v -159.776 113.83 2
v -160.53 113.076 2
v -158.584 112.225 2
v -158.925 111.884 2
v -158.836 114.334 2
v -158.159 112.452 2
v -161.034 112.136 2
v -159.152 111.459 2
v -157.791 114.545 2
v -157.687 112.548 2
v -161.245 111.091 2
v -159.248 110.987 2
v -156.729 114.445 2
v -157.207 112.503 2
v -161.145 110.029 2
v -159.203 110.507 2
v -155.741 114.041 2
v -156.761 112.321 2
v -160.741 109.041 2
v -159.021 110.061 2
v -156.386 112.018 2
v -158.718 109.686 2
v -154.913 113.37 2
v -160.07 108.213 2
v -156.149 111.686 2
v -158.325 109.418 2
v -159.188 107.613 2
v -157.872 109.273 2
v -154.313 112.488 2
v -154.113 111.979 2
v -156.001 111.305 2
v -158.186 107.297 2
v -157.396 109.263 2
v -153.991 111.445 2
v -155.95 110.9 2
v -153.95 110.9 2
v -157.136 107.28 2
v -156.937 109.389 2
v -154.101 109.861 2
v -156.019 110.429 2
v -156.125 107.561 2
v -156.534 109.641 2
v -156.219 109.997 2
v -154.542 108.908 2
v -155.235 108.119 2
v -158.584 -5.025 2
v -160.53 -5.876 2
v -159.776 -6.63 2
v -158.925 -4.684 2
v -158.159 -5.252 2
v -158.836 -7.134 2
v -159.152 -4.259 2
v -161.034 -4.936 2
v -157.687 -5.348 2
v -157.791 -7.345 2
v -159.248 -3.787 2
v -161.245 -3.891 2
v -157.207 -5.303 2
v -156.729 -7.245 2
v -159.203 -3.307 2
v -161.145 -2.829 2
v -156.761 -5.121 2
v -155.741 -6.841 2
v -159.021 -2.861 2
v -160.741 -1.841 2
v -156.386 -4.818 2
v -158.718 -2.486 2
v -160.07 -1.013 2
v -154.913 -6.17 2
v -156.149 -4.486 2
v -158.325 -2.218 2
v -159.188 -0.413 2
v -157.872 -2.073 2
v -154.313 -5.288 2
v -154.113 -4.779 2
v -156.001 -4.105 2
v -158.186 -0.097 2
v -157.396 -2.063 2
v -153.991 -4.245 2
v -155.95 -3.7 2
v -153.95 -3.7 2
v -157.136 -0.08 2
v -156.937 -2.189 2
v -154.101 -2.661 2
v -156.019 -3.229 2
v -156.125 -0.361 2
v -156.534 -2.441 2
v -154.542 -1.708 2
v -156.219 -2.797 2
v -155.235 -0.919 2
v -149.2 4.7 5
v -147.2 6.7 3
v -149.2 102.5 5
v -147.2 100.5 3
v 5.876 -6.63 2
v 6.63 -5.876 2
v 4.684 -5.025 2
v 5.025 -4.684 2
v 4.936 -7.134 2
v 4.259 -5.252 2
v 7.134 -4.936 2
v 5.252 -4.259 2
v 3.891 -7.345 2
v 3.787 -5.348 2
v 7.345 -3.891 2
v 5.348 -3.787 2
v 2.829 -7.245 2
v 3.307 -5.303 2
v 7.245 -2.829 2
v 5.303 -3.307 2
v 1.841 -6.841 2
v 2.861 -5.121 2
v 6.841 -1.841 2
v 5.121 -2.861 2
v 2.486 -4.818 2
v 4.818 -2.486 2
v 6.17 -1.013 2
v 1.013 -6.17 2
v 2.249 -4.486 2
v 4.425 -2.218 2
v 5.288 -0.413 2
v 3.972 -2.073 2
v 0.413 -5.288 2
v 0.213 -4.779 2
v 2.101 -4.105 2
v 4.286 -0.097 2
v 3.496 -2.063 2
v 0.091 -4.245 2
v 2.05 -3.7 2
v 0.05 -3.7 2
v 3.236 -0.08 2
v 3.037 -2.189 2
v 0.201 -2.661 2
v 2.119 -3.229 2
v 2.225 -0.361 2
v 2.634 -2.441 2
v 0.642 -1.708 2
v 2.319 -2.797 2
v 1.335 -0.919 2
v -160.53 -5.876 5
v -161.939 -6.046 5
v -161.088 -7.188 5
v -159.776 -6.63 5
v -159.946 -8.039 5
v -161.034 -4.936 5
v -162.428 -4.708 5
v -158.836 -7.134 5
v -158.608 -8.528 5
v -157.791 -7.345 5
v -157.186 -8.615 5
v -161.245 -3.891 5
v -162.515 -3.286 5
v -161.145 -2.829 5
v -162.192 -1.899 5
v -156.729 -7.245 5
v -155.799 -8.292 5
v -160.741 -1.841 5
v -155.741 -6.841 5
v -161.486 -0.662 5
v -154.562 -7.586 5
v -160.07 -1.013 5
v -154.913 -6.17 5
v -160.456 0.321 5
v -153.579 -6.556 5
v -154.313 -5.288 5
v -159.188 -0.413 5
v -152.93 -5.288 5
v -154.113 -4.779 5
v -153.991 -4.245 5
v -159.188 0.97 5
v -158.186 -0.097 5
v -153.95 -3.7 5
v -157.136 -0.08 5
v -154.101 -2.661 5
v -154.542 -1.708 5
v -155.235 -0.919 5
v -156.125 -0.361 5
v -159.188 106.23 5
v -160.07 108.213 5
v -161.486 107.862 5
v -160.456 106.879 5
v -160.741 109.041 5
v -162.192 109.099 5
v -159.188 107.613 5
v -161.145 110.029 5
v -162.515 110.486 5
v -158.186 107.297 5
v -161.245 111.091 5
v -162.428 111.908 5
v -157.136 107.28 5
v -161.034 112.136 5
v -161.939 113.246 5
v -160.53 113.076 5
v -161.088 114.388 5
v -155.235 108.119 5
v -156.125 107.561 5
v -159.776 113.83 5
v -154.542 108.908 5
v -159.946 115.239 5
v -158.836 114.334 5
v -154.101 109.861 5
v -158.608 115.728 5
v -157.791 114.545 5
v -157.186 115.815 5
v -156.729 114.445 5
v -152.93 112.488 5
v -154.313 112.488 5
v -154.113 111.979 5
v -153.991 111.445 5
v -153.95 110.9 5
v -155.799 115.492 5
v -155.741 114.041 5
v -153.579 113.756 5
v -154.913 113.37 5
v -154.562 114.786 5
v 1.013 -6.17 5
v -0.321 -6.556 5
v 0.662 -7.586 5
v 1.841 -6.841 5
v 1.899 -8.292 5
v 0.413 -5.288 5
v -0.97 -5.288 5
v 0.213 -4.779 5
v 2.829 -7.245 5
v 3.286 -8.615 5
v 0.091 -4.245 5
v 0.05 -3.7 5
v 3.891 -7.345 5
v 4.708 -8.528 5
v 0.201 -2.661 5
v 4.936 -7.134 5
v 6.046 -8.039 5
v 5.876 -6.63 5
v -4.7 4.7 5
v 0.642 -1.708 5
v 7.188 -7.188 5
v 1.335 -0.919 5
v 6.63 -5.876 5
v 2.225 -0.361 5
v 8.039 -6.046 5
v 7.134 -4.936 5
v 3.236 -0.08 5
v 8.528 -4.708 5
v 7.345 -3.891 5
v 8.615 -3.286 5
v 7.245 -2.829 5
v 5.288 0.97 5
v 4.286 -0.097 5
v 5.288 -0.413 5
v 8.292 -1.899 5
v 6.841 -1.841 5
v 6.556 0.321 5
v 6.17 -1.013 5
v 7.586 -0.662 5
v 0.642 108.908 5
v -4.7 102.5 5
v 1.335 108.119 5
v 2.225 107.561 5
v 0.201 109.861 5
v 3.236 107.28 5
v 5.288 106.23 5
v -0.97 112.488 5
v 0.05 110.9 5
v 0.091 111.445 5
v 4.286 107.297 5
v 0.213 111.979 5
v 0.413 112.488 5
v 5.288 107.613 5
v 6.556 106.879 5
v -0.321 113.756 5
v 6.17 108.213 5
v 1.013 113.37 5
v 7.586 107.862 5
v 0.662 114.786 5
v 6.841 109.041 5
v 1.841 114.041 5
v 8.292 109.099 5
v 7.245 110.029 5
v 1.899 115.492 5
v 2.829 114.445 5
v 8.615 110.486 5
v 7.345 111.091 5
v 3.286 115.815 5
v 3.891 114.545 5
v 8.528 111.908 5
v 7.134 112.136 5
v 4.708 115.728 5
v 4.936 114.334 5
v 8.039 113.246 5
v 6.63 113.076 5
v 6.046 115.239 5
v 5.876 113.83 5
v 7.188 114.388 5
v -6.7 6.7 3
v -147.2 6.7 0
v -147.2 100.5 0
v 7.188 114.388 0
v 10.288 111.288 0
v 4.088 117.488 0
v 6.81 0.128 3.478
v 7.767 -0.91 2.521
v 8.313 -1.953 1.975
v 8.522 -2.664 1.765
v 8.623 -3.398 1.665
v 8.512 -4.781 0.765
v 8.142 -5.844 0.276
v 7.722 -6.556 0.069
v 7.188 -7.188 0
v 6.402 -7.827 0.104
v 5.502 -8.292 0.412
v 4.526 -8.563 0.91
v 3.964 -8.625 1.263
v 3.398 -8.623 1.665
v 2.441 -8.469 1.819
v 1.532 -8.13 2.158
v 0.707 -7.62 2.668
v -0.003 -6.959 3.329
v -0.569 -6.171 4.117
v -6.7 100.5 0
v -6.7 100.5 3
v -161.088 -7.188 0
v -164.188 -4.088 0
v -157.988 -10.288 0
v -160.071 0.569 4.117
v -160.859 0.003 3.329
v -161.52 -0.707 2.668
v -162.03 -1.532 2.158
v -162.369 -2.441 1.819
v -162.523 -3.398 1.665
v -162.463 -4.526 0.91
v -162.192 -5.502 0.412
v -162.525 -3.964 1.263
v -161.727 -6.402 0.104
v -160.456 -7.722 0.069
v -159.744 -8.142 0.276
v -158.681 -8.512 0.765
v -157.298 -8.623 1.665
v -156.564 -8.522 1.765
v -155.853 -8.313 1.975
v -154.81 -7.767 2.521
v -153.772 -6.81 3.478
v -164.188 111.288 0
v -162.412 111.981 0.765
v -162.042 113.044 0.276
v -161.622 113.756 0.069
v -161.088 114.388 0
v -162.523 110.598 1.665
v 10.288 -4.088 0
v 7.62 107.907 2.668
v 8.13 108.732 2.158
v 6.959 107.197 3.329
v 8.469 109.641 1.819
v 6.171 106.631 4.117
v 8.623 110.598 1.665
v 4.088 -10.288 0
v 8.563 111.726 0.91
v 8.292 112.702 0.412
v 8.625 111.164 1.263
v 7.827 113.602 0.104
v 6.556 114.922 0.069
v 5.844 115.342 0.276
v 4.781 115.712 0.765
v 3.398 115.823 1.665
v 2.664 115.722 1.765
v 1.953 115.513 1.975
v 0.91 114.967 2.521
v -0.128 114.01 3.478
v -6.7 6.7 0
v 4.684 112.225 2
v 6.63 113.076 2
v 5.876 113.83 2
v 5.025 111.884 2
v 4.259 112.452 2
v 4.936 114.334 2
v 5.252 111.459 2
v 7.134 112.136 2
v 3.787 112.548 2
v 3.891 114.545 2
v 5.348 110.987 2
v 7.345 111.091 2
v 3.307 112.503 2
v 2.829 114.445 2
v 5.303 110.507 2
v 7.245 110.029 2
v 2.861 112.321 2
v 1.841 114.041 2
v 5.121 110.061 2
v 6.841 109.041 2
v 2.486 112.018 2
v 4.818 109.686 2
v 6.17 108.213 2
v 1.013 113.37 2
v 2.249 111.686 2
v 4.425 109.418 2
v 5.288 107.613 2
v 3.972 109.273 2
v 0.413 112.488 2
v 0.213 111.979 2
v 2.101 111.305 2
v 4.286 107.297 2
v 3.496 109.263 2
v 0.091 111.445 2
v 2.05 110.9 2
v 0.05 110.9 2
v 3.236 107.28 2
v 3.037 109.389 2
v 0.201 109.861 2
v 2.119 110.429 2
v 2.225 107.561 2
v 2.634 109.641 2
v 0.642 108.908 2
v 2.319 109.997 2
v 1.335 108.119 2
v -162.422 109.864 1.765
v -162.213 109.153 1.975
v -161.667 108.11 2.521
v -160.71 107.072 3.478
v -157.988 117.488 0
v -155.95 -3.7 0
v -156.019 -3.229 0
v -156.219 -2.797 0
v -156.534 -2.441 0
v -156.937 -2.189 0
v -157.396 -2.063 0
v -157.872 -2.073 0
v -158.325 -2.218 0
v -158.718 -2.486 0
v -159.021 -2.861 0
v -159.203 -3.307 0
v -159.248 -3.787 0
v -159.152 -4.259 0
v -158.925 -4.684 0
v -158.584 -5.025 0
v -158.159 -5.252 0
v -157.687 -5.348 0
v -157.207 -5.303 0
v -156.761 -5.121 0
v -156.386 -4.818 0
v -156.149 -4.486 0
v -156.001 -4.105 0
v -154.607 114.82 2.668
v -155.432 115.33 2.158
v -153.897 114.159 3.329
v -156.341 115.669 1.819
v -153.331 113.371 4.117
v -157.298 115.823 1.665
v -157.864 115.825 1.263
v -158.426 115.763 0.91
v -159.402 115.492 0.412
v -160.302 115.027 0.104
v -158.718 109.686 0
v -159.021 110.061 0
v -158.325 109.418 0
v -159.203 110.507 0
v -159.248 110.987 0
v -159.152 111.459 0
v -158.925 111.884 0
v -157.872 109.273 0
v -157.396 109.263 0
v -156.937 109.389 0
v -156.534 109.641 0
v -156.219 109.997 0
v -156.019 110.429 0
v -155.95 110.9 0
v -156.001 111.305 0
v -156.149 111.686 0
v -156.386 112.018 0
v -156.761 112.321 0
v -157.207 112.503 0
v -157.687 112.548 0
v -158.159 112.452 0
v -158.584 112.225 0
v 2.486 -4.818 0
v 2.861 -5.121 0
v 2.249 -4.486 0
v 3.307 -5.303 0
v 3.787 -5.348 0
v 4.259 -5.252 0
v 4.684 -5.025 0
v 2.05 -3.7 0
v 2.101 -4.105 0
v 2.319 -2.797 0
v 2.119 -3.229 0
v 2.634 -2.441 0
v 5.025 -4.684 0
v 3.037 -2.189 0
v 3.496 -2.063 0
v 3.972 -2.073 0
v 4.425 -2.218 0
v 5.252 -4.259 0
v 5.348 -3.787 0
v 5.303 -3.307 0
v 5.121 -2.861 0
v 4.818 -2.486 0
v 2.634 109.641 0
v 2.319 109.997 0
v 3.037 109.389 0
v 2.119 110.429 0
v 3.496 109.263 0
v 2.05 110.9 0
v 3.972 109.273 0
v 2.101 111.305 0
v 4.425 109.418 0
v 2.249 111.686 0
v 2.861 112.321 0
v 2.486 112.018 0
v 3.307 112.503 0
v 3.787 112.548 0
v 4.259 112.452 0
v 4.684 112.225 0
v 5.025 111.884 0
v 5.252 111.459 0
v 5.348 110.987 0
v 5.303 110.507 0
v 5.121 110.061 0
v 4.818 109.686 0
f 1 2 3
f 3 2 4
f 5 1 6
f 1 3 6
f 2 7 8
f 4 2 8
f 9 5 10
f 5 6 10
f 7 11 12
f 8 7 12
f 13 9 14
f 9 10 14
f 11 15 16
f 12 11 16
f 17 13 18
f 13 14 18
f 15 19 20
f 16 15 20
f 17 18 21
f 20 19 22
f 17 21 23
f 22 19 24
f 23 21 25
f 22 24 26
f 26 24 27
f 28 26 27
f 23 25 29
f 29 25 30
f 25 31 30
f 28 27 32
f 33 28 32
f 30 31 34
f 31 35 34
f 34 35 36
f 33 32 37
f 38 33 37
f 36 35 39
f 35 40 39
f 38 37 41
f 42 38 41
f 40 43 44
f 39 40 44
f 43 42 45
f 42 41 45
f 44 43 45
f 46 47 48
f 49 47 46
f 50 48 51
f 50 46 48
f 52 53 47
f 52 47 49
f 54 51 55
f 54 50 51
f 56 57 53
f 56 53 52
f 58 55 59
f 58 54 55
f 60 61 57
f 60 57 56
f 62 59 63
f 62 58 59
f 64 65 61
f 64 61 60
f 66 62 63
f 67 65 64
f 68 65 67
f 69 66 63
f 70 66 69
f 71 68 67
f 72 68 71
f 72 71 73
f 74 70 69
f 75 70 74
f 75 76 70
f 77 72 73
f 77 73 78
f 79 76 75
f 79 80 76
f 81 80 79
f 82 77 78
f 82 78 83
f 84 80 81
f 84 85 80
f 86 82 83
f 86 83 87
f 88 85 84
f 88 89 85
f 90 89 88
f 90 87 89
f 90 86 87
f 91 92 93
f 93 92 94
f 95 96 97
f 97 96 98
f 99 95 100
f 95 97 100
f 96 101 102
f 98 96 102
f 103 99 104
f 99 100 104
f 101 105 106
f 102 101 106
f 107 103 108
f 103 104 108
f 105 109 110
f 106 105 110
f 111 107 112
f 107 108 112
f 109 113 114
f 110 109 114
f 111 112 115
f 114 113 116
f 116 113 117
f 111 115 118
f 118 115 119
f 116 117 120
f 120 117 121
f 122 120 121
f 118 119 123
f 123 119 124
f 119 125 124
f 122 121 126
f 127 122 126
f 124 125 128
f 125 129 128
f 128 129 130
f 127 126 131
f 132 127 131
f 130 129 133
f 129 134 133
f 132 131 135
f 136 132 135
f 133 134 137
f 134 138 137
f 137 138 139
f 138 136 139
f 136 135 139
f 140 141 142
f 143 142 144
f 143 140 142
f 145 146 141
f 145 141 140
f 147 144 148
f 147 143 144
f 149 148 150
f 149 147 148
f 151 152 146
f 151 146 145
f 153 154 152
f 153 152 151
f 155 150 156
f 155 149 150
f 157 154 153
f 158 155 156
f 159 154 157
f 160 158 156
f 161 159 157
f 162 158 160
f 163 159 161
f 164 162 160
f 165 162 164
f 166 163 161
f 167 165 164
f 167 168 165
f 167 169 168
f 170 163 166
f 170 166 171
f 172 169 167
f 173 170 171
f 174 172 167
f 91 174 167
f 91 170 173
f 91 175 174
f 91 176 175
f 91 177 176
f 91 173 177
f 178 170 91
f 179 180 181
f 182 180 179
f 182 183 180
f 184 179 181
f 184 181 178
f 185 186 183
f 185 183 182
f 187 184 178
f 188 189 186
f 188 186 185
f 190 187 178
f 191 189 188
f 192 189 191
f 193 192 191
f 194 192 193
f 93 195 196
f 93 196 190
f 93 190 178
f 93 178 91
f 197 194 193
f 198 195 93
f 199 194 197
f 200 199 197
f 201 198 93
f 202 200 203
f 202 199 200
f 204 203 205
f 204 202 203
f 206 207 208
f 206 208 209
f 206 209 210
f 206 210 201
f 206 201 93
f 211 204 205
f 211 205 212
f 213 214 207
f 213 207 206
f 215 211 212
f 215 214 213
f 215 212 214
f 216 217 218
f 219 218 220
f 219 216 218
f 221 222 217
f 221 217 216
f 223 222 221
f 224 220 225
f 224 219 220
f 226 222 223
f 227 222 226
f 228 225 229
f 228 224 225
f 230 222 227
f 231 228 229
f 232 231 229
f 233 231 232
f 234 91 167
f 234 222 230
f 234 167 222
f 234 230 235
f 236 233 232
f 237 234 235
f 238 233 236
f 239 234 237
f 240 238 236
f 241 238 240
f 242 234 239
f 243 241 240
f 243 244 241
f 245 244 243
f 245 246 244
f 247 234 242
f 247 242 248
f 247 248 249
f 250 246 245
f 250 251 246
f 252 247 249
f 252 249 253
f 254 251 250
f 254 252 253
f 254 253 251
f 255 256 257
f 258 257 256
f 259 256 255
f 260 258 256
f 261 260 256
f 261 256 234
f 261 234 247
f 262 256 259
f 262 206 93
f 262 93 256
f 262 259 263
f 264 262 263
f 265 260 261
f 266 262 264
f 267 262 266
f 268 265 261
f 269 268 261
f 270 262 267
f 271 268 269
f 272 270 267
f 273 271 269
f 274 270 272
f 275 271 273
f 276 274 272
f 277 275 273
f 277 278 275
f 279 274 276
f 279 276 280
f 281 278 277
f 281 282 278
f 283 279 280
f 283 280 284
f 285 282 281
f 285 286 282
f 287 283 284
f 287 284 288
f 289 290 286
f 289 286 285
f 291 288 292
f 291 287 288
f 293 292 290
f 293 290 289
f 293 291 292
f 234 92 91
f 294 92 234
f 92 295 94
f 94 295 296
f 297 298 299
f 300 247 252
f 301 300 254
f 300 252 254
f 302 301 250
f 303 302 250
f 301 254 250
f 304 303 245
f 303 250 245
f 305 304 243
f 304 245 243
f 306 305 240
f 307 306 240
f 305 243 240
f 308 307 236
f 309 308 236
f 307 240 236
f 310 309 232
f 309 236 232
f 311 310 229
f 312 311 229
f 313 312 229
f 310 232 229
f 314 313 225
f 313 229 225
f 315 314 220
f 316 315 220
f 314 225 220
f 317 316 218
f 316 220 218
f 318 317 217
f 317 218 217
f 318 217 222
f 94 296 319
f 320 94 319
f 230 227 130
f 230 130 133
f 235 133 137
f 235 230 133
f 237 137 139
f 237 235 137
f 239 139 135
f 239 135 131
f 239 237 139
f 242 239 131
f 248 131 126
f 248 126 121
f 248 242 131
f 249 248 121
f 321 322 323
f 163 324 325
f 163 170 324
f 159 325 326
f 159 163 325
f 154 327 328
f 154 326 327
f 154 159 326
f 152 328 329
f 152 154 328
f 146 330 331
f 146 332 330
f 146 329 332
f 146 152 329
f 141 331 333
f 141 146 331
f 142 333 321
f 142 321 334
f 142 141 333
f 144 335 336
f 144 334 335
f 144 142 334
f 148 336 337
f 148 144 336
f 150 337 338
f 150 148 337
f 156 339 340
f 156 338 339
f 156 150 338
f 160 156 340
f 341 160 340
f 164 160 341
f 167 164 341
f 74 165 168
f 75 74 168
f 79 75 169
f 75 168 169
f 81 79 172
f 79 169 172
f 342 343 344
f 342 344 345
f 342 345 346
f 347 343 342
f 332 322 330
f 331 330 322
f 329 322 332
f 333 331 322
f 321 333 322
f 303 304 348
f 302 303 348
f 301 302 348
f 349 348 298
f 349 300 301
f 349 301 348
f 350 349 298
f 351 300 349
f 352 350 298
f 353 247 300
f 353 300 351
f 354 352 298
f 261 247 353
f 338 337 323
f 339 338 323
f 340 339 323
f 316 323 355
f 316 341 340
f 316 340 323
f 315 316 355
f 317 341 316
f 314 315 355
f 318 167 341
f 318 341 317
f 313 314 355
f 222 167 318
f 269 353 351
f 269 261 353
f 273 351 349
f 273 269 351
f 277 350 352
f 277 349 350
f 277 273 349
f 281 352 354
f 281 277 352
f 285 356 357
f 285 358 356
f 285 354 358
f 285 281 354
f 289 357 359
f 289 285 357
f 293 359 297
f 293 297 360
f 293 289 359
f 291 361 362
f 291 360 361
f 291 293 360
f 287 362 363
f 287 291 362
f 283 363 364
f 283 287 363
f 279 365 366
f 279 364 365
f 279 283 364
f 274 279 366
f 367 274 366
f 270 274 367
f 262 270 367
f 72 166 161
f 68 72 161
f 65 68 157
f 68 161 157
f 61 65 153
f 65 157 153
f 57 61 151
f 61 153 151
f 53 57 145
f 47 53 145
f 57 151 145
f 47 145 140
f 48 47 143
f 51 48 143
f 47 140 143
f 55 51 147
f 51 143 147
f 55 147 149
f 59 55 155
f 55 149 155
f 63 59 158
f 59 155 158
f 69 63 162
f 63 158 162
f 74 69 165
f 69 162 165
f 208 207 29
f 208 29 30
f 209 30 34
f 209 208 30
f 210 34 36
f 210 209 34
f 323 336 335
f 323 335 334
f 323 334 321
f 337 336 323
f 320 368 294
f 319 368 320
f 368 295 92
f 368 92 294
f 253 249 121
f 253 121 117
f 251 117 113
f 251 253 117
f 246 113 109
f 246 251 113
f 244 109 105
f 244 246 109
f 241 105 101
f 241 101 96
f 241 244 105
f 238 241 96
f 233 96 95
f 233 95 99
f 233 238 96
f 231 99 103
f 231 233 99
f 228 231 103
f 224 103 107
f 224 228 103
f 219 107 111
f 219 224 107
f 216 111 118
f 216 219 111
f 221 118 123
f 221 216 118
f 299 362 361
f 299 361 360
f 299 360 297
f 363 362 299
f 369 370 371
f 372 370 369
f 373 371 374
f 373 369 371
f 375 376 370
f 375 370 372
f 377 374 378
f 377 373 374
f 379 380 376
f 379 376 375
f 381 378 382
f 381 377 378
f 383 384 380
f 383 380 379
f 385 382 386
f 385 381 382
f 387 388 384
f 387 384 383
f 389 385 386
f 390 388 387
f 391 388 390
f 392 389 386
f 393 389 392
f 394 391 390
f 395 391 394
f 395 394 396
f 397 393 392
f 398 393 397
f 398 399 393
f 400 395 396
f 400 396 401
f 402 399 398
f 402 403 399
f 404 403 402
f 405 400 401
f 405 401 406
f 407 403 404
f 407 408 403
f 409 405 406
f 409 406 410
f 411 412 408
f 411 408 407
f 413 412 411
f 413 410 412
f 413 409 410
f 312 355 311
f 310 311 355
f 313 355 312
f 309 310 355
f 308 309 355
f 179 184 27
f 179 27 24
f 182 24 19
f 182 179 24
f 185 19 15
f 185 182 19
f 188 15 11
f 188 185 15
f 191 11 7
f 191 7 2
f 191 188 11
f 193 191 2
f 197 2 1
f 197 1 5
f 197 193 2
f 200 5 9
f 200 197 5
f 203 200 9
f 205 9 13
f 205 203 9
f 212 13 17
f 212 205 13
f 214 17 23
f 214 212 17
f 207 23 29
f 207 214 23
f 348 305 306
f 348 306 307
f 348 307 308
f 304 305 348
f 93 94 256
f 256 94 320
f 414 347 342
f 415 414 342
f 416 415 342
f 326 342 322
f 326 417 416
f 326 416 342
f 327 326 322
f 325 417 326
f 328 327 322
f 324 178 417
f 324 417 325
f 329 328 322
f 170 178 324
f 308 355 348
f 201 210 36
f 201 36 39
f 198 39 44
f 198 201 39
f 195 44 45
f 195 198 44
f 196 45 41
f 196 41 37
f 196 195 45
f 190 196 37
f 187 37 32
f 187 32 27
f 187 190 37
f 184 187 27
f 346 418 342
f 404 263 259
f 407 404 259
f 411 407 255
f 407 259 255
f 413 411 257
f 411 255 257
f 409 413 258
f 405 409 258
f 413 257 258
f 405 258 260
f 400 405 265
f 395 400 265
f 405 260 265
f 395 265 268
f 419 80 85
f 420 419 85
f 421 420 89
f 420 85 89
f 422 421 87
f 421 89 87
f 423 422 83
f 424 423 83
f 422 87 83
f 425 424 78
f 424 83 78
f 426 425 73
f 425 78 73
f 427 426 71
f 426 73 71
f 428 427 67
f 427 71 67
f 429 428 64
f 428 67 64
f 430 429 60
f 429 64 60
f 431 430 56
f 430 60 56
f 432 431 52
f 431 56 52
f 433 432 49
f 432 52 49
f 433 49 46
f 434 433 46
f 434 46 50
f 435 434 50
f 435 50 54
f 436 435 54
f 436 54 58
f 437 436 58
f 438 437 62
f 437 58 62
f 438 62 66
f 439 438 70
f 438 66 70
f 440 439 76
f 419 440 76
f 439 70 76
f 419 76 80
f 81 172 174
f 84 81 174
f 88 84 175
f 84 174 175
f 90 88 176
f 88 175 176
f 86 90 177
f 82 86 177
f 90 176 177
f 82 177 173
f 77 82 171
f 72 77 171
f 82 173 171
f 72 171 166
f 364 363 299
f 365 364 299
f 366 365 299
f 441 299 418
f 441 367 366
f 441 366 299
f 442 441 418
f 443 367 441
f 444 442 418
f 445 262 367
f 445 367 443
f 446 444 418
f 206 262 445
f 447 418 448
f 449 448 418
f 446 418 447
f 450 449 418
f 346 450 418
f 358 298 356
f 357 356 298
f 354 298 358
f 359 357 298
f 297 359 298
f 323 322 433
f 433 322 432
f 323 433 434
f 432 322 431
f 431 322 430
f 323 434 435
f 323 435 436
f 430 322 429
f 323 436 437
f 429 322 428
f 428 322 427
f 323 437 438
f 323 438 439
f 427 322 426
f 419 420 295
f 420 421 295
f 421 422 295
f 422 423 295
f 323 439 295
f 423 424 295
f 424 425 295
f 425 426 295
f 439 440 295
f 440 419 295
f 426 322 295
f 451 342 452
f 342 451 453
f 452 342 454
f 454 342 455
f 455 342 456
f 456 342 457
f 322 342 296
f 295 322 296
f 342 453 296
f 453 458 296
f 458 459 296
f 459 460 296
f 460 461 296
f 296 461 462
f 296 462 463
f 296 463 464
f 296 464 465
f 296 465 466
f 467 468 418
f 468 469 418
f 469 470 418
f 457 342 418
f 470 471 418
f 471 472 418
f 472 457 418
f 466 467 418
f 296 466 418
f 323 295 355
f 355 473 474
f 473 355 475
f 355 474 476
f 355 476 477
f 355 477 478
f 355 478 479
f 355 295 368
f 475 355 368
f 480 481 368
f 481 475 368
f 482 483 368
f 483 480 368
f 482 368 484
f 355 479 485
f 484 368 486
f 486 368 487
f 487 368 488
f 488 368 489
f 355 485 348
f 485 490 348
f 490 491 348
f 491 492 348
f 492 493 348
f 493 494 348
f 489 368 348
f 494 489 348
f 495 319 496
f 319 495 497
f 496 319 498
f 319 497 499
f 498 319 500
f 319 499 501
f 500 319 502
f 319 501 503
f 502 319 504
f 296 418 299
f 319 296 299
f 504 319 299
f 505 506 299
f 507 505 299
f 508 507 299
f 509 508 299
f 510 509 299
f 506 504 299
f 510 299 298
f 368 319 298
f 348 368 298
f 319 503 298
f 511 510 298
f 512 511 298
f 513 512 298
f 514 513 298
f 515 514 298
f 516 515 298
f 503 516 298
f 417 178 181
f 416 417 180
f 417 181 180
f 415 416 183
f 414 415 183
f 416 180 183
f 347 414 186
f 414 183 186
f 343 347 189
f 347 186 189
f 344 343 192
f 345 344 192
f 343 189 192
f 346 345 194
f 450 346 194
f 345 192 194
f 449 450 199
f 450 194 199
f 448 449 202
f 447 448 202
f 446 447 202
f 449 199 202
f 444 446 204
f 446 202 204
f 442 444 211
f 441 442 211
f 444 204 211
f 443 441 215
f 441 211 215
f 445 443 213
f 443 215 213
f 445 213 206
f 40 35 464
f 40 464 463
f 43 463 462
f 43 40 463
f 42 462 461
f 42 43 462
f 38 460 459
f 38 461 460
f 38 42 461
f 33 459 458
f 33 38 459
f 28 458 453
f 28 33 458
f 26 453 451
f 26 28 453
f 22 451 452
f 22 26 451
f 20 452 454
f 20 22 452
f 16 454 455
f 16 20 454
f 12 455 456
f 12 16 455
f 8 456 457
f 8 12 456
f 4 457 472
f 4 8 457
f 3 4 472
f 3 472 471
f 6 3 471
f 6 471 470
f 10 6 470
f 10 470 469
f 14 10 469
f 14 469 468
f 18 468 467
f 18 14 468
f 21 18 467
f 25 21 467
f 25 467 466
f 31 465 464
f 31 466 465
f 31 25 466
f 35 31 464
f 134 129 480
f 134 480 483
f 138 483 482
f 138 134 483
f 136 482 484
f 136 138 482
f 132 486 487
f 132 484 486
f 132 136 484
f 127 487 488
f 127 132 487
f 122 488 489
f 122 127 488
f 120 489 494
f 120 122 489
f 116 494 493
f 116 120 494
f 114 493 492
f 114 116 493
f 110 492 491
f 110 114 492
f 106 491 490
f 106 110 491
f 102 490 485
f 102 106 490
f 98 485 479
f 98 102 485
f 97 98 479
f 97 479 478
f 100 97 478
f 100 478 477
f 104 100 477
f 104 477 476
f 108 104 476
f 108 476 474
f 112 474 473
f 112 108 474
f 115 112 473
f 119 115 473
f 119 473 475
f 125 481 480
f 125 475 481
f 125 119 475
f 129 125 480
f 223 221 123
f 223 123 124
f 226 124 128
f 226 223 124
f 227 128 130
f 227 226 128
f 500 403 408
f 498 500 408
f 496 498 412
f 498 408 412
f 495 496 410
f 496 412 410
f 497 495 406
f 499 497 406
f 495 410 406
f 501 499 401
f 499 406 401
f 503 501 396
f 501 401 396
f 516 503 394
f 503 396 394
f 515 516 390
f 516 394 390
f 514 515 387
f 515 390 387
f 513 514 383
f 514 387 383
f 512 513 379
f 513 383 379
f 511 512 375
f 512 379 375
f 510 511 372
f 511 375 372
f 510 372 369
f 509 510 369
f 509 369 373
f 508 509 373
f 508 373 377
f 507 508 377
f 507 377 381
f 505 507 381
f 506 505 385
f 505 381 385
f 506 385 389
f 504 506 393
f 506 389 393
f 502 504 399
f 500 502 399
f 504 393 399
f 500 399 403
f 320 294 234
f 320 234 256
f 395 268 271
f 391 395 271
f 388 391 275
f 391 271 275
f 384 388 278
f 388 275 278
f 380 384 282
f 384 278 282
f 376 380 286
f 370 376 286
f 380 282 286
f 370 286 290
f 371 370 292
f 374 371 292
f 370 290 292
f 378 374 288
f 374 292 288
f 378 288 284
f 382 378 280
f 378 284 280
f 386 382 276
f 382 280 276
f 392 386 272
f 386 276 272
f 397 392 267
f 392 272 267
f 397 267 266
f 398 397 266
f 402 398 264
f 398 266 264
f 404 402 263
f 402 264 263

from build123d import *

# Parameters (mm, degrees)
SKETCH1_W                                  = 140.5
SKETCH1_H                                  = 93.8
BOSS_EXTRUDE1_DEPTH                        = 5
CHAMFER1_SIZE                              = 5
CHAMFER2_SIZE                              = 2
SKETCH2_R                                  = 1.65
CUT_EXTRUDE1_DEPTH                         = 15
BOSS_EXTRUDE2_DEPTH                        = 5
CUT_EXTRUDE2_DEPTH                         = 3
MIRROR1_AT_THE_SECOND_PLANE_COPY_1_SKETC_R = 1.65
MIRROR1_AT_THE_SECOND_PLANE_COPY_1_DEPTH   = 15
MIRROR1_AT_THE_SECOND_PLANE_COPY_2_DEPTH   = 5
MIRROR1_AT_THE_SECOND_PLANE_COPY_3_DEPTH   = 3


with BuildPart() as part:
    # Sketch1 → Boss-Extrude1 (new body)
    with BuildSketch(Plane.XY):
        Polygon((-157.987704918, -10.287704918), (4.087704918, -10.287704918), (10.287704918, -4.087704918), (10.287704918, 111.287704918), (4.087704918, 117.487704918), (-157.987704918, 117.487704918), (-164.187704918, 111.287704918), (-164.187704918, -4.087704918), align=None)
        with Locations((-76.95, 53.6)):
            Rectangle(SKETCH1_W, SKETCH1_H, mode=Mode.SUBTRACT)
    extrude(amount=BOSS_EXTRUDE1_DEPTH)

    # Chamfer1
    chamfer1_edges = [part.edges().sort_by_distance(p)[0] for p in [
        (7.187704918, 114.387704918, 5),
        (10.287704918, 53.6, 5),
        (7.187704918, -7.187704918, 5),
        (-76.95, -10.287704918, 5),
        (-161.087704918, -7.187704918, 5),
        (-164.187704918, 53.6, 5),
        (-76.95, 117.487704918, 5),
        (-161.087704918, 114.387704918, 5),
    ]]
    chamfer(chamfer1_edges, length=CHAMFER1_SIZE - 0.0001)  # a hair under: the kernel refuses the full size

    # Chamfer2
    chamfer2_edges = [part.edges().sort_by_distance(p)[0] for p in [
        (-6.7, 53.6, 5),
        (-76.95, 100.5, 5),
        (-147.2, 53.6, 5),
        (-76.95, 6.7, 5),
    ]]
    chamfer(chamfer2_edges, length=CHAMFER2_SIZE)

    # Sketch2 → Cut-Extrude1 (cut)
    with BuildSketch(Plane.XY.offset(5)):
        with Locations((-157.6, -3.7)):
            Circle(SKETCH2_R)
    cut_extrude1 = extrude(amount=-CUT_EXTRUDE1_DEPTH, mode=Mode.SUBTRACT)

    # Sketch2<3> → Boss-Extrude2 (add)
    with BuildSketch(Plane.XY.offset(5)):
        with BuildLine():
            ThreePointArc((-159.187704918, -0.413407069), (-155.659977185, -0.608267237), (-153.95, -3.7))
            ThreePointArc((-153.95, -3.7), (-154.042011509, -4.514381914), (-154.313407069, -5.287704918))
            Line((-154.313407069, -5.287704918), (-152.930164426, -5.287704918))
            ThreePointArc((-152.930164426, -5.287704918), (-152.733713968, -4.504631246), (-152.667640403, -3.7))
            ThreePointArc((-152.667640403, -3.7), (-154.727976358, 0.309944063), (-159.187704918, 0.969835574))
            Line((-159.187704918, 0.969835574), (-159.187704918, -0.413407069))
        make_face()
        with BuildLine():
            ThreePointArc((-154.313407069, -5.287704918), (-160.180939751, -6.280939751), (-159.187704918, -0.413407069))
            Line((-159.187704918, -0.413407069), (-159.187704918, 0.969835574))
            ThreePointArc((-159.187704918, 0.969835574), (-161.087704918, -7.187704918), (-152.930164426, -5.287704918))
            Line((-152.930164426, -5.287704918), (-154.313407069, -5.287704918))
        make_face()
        with BuildLine():
            ThreePointArc((-154.313407069, -5.287704918), (-154.042011509, -4.514381914), (-153.95, -3.7))
            ThreePointArc((-153.95, -3.7), (-155.659977185, -0.608267237), (-159.187704918, -0.413407069))
            Line((-159.187704918, -0.413407069), (-159.187704918, -2.016637106))
            Line((-159.187704918, -2.016637106), (-158.717916434, -2.486425591))
            ThreePointArc((-158.717916434, -2.486425591), (-156.937452687, -2.188864315), (-155.95, -3.7))
            ThreePointArc((-155.95, -3.7), (-156.062974012, -4.300042592), (-156.386425591, -4.817916434))
            Line((-156.386425591, -4.817916434), (-155.916637106, -5.287704918))
            Line((-155.916637106, -5.287704918), (-154.313407069, -5.287704918))
        make_face()
        with BuildLine():
            Line((-159.187704918, -2.016637106), (-159.187704918, -0.413407069))
            ThreePointArc((-159.187704918, -0.413407069), (-160.180939751, -6.280939751), (-154.313407069, -5.287704918))
            Line((-154.313407069, -5.287704918), (-155.916637106, -5.287704918))
            Line((-155.916637106, -5.287704918), (-156.386425591, -4.817916434))
            ThreePointArc((-156.386425591, -4.817916434), (-158.766726189, -4.866726189), (-158.717916434, -2.486425591))
            Line((-158.717916434, -2.486425591), (-159.187704918, -2.016637106))
        make_face()
    boss_extrude2 = extrude(amount=-BOSS_EXTRUDE2_DEPTH)

    # Sketch2<4> → Cut-Extrude2 (cut)
    with BuildSketch(Plane.XY.offset(5)):
        with BuildLine():
            ThreePointArc((-154.313407069, -5.287704918), (-154.042011509, -4.514381914), (-153.95, -3.7))
            ThreePointArc((-153.95, -3.7), (-155.659977185, -0.608267237), (-159.187704918, -0.413407069))
            Line((-159.187704918, -0.413407069), (-159.187704918, -2.016637106))
            Line((-159.187704918, -2.016637106), (-158.717916434, -2.486425591))
            ThreePointArc((-158.717916434, -2.486425591), (-156.937452687, -2.188864315), (-155.95, -3.7))
            ThreePointArc((-155.95, -3.7), (-156.062974012, -4.300042592), (-156.386425591, -4.817916434))
            Line((-156.386425591, -4.817916434), (-155.916637106, -5.287704918))
            Line((-155.916637106, -5.287704918), (-154.313407069, -5.287704918))
        make_face()
        with BuildLine():
            Line((-159.187704918, -2.016637106), (-159.187704918, -0.413407069))
            ThreePointArc((-159.187704918, -0.413407069), (-160.180939751, -6.280939751), (-154.313407069, -5.287704918))
            Line((-154.313407069, -5.287704918), (-155.916637106, -5.287704918))
            Line((-155.916637106, -5.287704918), (-156.386425591, -4.817916434))
            ThreePointArc((-156.386425591, -4.817916434), (-158.766726189, -4.866726189), (-158.717916434, -2.486425591))
            Line((-158.717916434, -2.486425591), (-159.187704918, -2.016637106))
        make_face()
    cut_extrude2 = extrude(amount=-CUT_EXTRUDE2_DEPTH, mode=Mode.SUBTRACT)

    # Mirror1: Cut-Extrude1, Boss-Extrude2, Cut-Extrude2 across plane
    add(cut_extrude1.mirror(Plane(origin=(-76.95, 0, 0), x_dir=(0, 0, 1), z_dir=(1, 0, 0))), mode=Mode.SUBTRACT)
    add(boss_extrude2.mirror(Plane(origin=(-76.95, 0, 0), x_dir=(0, 0, 1), z_dir=(1, 0, 0))))
    add(cut_extrude2.mirror(Plane(origin=(-76.95, 0, 0), x_dir=(0, 0, 1), z_dir=(1, 0, 0))), mode=Mode.SUBTRACT)

    # Mirror1 at the second plane: Cut-Extrude1, Boss-Extrude2, Cut-Extrude2 across plane
    add(cut_extrude1.mirror(Plane(origin=(0, 53.6, 0), x_dir=(0, 0, 1), z_dir=(0, -1, 0))), mode=Mode.SUBTRACT)
    add(boss_extrude2.mirror(Plane(origin=(0, 53.6, 0), x_dir=(0, 0, 1), z_dir=(0, -1, 0))))
    add(cut_extrude2.mirror(Plane(origin=(0, 53.6, 0), x_dir=(0, 0, 1), z_dir=(0, -1, 0))), mode=Mode.SUBTRACT)

    # Mirror1 at the second plane copy 1 sketc → Mirror1 at the second plane copy 1 (cut)
    with BuildSketch(Plane(origin=(-153.9, 107.2, 5), x_dir=(-1, 0, 0), z_dir=(0, 0, 1))):
        with Locations((-157.6, -3.7)):
            Circle(MIRROR1_AT_THE_SECOND_PLANE_COPY_1_SKETC_R)
    extrude(amount=-MIRROR1_AT_THE_SECOND_PLANE_COPY_1_DEPTH, mode=Mode.SUBTRACT)

    # Mirror1 at the second plane copy 2 sketc → Mirror1 at the second plane copy 2 (add)
    with BuildSketch(Plane(origin=(-153.9, 107.2, 5), x_dir=(-1, 0, 0), z_dir=(0, 0, 1))):
        with BuildLine():
            ThreePointArc((-159.187704918, -0.413407069), (-155.659977185, -0.608267237), (-153.95, -3.7))
            ThreePointArc((-153.95, -3.7), (-154.042011509, -4.514381914), (-154.313407069, -5.287704918))
            Line((-154.313407069, -5.287704918), (-152.930164426, -5.287704918))
            ThreePointArc((-152.930164426, -5.287704918), (-152.733713968, -4.504631246), (-152.667640403, -3.7))
            ThreePointArc((-152.667640403, -3.7), (-154.727976358, 0.309944063), (-159.187704918, 0.969835574))
            Line((-159.187704918, 0.969835574), (-159.187704918, -0.413407069))
        make_face()
        with BuildLine():
            ThreePointArc((-154.313407069, -5.287704918), (-160.180939751, -6.280939751), (-159.187704918, -0.413407069))
            Line((-159.187704918, -0.413407069), (-159.187704918, 0.969835574))
            ThreePointArc((-159.187704918, 0.969835574), (-161.087704918, -7.187704918), (-152.930164426, -5.287704918))
            Line((-152.930164426, -5.287704918), (-154.313407069, -5.287704918))
        make_face()
        with BuildLine():
            ThreePointArc((-154.313407069, -5.287704918), (-154.042011509, -4.514381914), (-153.95, -3.7))
            ThreePointArc((-153.95, -3.7), (-155.659977185, -0.608267237), (-159.187704918, -0.413407069))
            Line((-159.187704918, -0.413407069), (-159.187704918, -2.016637106))
            Line((-159.187704918, -2.016637106), (-158.717916434, -2.486425591))
            ThreePointArc((-158.717916434, -2.486425591), (-156.937452687, -2.188864315), (-155.95, -3.7))
            ThreePointArc((-155.95, -3.7), (-156.062974012, -4.300042592), (-156.386425591, -4.817916434))
            Line((-156.386425591, -4.817916434), (-155.916637106, -5.287704918))
            Line((-155.916637106, -5.287704918), (-154.313407069, -5.287704918))
        make_face()
        with BuildLine():
            Line((-159.187704918, -2.016637106), (-159.187704918, -0.413407069))
            ThreePointArc((-159.187704918, -0.413407069), (-160.180939751, -6.280939751), (-154.313407069, -5.287704918))
            Line((-154.313407069, -5.287704918), (-155.916637106, -5.287704918))
            Line((-155.916637106, -5.287704918), (-156.386425591, -4.817916434))
            ThreePointArc((-156.386425591, -4.817916434), (-158.766726189, -4.866726189), (-158.717916434, -2.486425591))
            Line((-158.717916434, -2.486425591), (-159.187704918, -2.016637106))
        make_face()
    extrude(amount=-MIRROR1_AT_THE_SECOND_PLANE_COPY_2_DEPTH)

    # Mirror1 at the second plane copy 3 sketc → Mirror1 at the second plane copy 3 (cut)
    with BuildSketch(Plane(origin=(-153.9, 107.2, 5), x_dir=(-1, 0, 0), z_dir=(0, 0, 1))):
        with BuildLine():
            ThreePointArc((-154.313407069, -5.287704918), (-154.042011509, -4.514381914), (-153.95, -3.7))
            ThreePointArc((-153.95, -3.7), (-155.659977185, -0.608267237), (-159.187704918, -0.413407069))
            Line((-159.187704918, -0.413407069), (-159.187704918, -2.016637106))
            Line((-159.187704918, -2.016637106), (-158.717916434, -2.486425591))
            ThreePointArc((-158.717916434, -2.486425591), (-156.937452687, -2.188864315), (-155.95, -3.7))
            ThreePointArc((-155.95, -3.7), (-156.062974012, -4.300042592), (-156.386425591, -4.817916434))
            Line((-156.386425591, -4.817916434), (-155.916637106, -5.287704918))
            Line((-155.916637106, -5.287704918), (-154.313407069, -5.287704918))
        make_face()
        with BuildLine():
            Line((-159.187704918, -2.016637106), (-159.187704918, -0.413407069))
            ThreePointArc((-159.187704918, -0.413407069), (-160.180939751, -6.280939751), (-154.313407069, -5.287704918))
            Line((-154.313407069, -5.287704918), (-155.916637106, -5.287704918))
            Line((-155.916637106, -5.287704918), (-156.386425591, -4.817916434))
            ThreePointArc((-156.386425591, -4.817916434), (-158.766726189, -4.866726189), (-158.717916434, -2.486425591))
            Line((-158.717916434, -2.486425591), (-159.187704918, -2.016637106))
        make_face()
    extrude(amount=-MIRROR1_AT_THE_SECOND_PLANE_COPY_3_DEPTH, mode=Mode.SUBTRACT)


solid = part.part
